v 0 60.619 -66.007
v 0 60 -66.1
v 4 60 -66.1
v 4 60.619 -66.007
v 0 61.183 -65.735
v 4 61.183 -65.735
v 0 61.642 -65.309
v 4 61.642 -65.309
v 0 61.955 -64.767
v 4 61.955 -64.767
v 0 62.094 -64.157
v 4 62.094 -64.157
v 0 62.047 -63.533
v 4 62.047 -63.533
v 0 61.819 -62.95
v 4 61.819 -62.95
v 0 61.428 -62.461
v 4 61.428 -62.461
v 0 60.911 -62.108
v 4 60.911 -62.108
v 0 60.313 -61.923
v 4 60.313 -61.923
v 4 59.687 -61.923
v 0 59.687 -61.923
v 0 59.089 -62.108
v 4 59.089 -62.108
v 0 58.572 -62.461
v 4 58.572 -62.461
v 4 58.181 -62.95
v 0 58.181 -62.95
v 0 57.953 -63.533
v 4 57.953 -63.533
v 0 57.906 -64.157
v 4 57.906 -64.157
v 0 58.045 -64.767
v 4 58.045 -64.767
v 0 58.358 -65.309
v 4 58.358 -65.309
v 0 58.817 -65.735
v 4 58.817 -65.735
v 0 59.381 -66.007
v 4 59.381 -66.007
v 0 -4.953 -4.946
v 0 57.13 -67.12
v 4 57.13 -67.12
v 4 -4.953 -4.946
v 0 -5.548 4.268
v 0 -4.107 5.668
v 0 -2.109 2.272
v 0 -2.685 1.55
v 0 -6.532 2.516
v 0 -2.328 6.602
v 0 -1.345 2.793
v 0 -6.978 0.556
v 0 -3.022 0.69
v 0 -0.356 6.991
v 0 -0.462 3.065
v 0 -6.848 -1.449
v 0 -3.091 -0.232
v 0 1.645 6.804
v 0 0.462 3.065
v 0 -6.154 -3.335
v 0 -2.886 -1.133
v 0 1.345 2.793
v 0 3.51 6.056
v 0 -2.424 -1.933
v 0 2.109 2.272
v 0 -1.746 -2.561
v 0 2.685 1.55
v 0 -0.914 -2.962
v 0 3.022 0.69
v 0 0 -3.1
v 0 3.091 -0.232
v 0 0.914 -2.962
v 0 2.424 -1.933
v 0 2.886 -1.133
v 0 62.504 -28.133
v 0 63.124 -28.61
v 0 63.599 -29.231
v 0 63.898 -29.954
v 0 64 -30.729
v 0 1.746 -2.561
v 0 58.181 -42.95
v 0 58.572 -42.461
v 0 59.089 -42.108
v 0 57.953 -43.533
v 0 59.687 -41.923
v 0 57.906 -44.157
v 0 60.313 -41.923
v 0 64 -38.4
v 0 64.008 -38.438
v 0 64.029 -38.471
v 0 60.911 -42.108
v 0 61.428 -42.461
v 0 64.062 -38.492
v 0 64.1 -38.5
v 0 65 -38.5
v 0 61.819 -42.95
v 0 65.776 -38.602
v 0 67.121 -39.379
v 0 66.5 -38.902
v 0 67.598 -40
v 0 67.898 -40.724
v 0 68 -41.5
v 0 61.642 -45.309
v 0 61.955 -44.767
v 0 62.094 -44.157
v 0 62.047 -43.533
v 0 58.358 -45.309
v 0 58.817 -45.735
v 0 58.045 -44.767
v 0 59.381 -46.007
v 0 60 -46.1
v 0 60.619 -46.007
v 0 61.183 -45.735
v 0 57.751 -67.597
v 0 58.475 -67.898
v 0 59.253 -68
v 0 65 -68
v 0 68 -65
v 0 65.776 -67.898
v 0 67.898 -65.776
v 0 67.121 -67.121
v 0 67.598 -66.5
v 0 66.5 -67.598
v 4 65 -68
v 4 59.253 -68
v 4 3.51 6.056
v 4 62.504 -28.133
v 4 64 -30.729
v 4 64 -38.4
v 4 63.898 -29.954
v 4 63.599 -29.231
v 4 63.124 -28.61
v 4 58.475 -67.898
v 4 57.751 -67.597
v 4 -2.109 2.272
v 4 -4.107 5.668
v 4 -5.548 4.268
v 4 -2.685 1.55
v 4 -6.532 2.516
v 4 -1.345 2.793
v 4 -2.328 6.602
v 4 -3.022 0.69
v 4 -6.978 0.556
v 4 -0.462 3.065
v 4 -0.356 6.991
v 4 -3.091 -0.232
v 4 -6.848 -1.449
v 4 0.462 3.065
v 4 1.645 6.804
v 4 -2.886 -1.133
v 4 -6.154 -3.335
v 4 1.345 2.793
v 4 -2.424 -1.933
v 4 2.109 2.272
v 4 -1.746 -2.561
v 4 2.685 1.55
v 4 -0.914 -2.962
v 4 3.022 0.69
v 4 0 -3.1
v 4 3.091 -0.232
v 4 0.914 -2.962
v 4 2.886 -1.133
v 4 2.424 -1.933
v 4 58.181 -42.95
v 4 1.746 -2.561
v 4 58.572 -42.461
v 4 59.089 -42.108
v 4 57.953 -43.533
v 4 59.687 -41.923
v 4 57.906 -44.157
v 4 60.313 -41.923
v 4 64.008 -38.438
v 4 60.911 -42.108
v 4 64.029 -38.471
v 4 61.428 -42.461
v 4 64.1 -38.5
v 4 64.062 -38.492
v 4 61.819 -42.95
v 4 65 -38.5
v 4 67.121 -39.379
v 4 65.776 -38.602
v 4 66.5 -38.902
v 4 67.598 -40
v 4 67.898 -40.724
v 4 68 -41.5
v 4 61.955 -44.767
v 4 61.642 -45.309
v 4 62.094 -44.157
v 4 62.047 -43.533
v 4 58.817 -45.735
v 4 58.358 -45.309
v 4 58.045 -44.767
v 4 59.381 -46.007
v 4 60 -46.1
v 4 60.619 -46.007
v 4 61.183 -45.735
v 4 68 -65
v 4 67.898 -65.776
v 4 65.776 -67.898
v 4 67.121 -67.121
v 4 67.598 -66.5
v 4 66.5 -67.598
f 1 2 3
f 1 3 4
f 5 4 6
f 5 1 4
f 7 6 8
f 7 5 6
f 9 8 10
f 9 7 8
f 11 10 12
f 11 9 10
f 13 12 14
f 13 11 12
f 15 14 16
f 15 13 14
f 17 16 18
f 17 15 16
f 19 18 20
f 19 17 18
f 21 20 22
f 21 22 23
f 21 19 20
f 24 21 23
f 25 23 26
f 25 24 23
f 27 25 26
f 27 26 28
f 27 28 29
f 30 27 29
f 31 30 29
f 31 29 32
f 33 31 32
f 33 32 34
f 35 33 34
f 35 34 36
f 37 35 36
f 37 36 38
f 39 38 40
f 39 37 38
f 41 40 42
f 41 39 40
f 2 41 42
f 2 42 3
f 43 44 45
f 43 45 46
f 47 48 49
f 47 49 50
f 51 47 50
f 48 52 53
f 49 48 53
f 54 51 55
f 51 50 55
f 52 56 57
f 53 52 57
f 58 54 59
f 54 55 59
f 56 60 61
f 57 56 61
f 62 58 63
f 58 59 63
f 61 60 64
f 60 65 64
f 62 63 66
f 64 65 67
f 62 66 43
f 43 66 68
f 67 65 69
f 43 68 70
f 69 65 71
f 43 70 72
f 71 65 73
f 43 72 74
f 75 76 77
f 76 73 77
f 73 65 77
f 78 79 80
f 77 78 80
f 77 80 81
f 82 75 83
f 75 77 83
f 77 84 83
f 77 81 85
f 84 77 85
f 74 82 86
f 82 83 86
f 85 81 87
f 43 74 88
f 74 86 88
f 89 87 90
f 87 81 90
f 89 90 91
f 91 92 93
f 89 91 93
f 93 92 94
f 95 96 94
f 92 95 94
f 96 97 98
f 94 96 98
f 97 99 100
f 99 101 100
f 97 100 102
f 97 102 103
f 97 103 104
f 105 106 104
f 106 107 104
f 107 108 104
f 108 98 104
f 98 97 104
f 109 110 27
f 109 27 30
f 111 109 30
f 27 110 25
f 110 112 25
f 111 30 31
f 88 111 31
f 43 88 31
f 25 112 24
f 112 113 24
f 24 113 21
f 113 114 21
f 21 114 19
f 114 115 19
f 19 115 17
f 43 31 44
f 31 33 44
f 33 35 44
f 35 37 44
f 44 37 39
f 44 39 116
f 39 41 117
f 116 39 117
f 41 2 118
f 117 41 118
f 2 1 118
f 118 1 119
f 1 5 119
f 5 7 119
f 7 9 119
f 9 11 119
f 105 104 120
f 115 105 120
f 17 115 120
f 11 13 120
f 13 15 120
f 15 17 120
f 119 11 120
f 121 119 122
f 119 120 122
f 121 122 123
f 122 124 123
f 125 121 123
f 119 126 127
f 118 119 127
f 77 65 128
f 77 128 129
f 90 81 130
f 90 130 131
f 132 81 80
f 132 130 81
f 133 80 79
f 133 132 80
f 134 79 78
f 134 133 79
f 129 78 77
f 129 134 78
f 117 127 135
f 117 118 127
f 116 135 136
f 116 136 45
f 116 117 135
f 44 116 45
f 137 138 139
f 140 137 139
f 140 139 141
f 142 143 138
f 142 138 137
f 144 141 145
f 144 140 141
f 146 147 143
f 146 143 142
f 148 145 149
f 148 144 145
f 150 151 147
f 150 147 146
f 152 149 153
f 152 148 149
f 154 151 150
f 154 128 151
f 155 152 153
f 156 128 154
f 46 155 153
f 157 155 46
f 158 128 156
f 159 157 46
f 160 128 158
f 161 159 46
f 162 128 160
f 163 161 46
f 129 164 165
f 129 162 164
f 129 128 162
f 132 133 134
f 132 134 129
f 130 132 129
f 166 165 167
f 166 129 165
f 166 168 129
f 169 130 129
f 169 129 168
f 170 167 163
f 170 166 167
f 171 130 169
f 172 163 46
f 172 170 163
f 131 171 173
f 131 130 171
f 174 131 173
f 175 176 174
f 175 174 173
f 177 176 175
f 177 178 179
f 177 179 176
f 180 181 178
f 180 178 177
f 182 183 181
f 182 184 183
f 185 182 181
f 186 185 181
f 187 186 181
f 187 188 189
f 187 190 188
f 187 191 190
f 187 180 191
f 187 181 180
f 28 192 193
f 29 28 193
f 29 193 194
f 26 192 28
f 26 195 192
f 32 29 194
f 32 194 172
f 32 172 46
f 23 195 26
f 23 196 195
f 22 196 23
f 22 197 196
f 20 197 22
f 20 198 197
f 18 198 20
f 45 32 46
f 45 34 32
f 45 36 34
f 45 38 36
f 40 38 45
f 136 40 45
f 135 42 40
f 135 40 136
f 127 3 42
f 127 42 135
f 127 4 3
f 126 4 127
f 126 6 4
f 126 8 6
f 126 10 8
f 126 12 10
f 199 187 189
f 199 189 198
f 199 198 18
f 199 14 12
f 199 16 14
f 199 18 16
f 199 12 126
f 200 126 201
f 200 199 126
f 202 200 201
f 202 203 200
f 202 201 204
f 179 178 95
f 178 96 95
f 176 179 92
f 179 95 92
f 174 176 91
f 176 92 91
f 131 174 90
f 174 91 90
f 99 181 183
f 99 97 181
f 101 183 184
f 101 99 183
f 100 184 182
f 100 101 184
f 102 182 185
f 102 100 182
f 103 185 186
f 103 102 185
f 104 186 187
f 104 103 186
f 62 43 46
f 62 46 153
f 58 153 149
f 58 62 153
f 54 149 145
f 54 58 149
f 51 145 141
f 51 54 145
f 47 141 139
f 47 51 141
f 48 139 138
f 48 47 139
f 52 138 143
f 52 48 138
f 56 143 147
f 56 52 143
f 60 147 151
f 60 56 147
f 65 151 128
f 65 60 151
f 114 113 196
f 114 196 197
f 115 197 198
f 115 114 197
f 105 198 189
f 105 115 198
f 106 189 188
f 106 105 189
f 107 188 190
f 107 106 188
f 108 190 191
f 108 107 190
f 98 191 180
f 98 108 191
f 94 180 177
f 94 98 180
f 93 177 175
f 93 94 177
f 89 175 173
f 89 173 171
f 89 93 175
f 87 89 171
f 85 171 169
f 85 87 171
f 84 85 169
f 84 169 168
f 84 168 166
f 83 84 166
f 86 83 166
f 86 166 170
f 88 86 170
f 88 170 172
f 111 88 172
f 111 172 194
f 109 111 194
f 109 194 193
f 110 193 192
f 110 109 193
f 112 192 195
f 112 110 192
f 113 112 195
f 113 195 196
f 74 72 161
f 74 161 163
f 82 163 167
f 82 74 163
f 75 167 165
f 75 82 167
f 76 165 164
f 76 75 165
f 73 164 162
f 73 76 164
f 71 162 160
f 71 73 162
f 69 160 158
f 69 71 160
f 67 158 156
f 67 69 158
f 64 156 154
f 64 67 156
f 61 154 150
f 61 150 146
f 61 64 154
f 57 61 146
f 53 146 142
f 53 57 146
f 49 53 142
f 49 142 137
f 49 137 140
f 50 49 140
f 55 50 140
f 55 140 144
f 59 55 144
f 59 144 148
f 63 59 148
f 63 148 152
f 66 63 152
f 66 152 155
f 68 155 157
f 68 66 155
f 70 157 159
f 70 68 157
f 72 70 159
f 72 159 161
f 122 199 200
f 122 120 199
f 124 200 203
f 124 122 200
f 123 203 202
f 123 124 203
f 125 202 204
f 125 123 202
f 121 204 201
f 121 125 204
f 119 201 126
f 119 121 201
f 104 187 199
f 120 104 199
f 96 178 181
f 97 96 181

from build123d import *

# Parameters (mm, degrees)
SKETCH_1_R          = 3.1
SKETCH_1_R_2        = 2.1
EXTRUDE_1_DEPTH     = 4
SKETCH_2_W          = 35.5
SKETCH_2_H          = 4
EXTRUDE_2_DEPTH     = 4
CUT_EXTRUDE_1_DEPTH = 5
FILLET_1_R          = 3
FILLET_2_R          = 0.1


with BuildPart() as part:
    # 草图1 → 凸台-拉伸1 (new body)
    with BuildSketch(Plane(origin=(0, 0, 0), x_dir=(0, 0, -1), z_dir=(1, 0, 0))):
        with BuildLine():
            Line((-6.056426263, 3.50994315), (29, 64))
            Line((29, 64), (74, 64))
            Line((74, 64), (4.946141362, -4.95335095))
            ThreePointArc((4.946141362, -4.95335095), (-4.267905798, -5.548421406), (-6.056426263, 3.50994315))
        make_face()
        Circle(SKETCH_1_R, mode=Mode.SUBTRACT)
        with Locations((44, 60)):
            Circle(SKETCH_1_R_2, mode=Mode.SUBTRACT)
        with Locations((64, 60)):
            Circle(SKETCH_1_R_2, mode=Mode.SUBTRACT)
    extrude(amount=EXTRUDE_1_DEPTH)

    # 草图2 → 凸台-拉伸2 (add)
    with BuildSketch(Plane(origin=(4, 0, 0), x_dir=(0, 0, -1), z_dir=(1, 0, 0))):
        with Locations((56.25, 66)):
            Rectangle(SKETCH_2_W, SKETCH_2_H)
    extrude(amount=-EXTRUDE_2_DEPTH)

    # 草图3 → 切除-拉伸1 (cut, through all)
    with BuildSketch(Plane(origin=(4, 0, 0), x_dir=(0, 0, -1), z_dir=(1, 0, 0))):
        Polygon((74, 68), (68, 68), (68, 58.008732982), (74, 64), align=None)
    extrude(amount=-CUT_EXTRUDE_1_DEPTH, mode=Mode.SUBTRACT)

    # 圆角1
    fillet_1_edges = [part.edges().sort_by_distance(p)[0] for p in [
        (2, 68, -38.5),
        (2, 58.008732982, -68),
        (2, 68, -68),
        (2, 64, -29),
    ]]
    fillet(fillet_1_edges, radius=FILLET_1_R)

    # 圆角2
    fillet_2_edges = [part.edges().sort_by_distance(p)[0] for p in [
        (2, 64, -38.5),
    ]]
    fillet(fillet_2_edges, radius=FILLET_2_R)


solid = part.part
